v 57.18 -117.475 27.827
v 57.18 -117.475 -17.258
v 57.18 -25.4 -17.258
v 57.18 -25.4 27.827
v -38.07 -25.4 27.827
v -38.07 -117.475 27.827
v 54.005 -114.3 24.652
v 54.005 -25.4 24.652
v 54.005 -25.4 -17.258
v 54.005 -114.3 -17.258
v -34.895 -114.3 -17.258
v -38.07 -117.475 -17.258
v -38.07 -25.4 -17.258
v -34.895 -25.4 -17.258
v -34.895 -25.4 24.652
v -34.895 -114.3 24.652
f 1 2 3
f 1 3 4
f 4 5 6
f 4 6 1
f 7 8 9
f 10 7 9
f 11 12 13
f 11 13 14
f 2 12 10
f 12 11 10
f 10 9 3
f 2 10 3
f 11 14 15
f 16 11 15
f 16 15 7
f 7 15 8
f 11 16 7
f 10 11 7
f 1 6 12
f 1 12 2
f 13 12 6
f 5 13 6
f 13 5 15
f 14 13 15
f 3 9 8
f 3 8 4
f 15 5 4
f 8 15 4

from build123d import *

# Parameters (mm, degrees)
F1_DEPTH = 114.3
F3_W     = 95.25
F3_H     = 45.085
F4_DEPTH = 3.175
F6_D     = 27.432
F6_DEPTH = 3.175
F7_DEPTH = 3.175
F8_W     = 95.25
F8_H     = 25.4
F9_DEPTH = 45.086


with BuildPart() as f1:
    # F0 (on Front) → F1 (new body)
    with BuildSketch(Plane.XZ):
        Polygon((-38.070478, -17.257856), (-34.895478, -17.257856), (-34.895478, 24.652144), (54.004522, 24.652144), (54.004522, -17.257856), (57.179522, -17.257856), (57.179522, 27.827144), (-38.070478, 27.827144), align=None)
    extrude(amount=F1_DEPTH)

    # F3 (on face) + F0 (on Front) → F4 (join)
    with BuildSketch(Plane.XZ.offset(114.3)):
        with Locations((9.554522, 5.284644)):
            Rectangle(F3_W, F3_H)
    with BuildSketch(Plane.XZ):
        Polygon((-38.070478, -17.257856), (-34.895478, -17.257856), (-34.895478, 24.652144), (54.004522, 24.652144), (54.004522, -17.257856), (57.179522, -17.257856), (57.179522, 27.827144), (-38.070478, 27.827144), align=None)
        with BuildLine():
            Line((-34.895478, 24.652144), (-34.895478, -17.257856))
            Line((-34.895478, -17.257856), (-32.609478, -17.257856))
            Line((-32.609478, -17.257856), (-32.609478, 9.669455))
            ThreePointArc((-32.609478, 9.669455), (-18.893478, 21.604144), (-5.177478, 9.669455))
            Line((-5.177478, 9.669455), (-5.177478, -17.257856))
            Line((-5.177478, -17.257856), (54.004522, -17.257856))
            Line((54.004522, -17.257856), (54.004522, 24.652144))
            Line((54.004522, 24.652144), (-34.895478, 24.652144))
        make_face()
        with BuildLine():
            Line((-32.609478, 9.669455), (-32.609478, -17.257856))
            Line((-32.609478, -17.257856), (-5.177478, -17.257856))
            Line((-5.177478, -17.257856), (-5.177478, 9.669455))
            ThreePointArc((-5.177478, 9.669455), (-18.893478, 21.604144), (-32.609478, 9.669455))
        make_face()
    extrude(amount=F4_DEPTH)

    # F6
    with Locations(Plane(origin=(0, 0, 0), x_dir=(1, 0, 0), z_dir=(0, 1, 0))):
        with Locations((-21.159343, 10.779062)):
            Hole(F6_D / 2, depth=F6_DEPTH)

    # F5 (on face) → F7 (cut)
    with BuildSketch(Plane.XZ):
        with BuildLine():
            Line((-34.875343, 10.779062), (-7.443343, 10.779062))
            ThreePointArc((-7.443343, 10.779062), (-21.159343, 24.495062), (-34.875343, 10.779062))
        make_face()
        with BuildLine():
            Line((-7.443343, -18.13873), (-7.443343, 10.779062))
            ThreePointArc((-7.443343, 10.779062), (-21.159343, -2.936938), (-34.875343, 10.779062))
            Line((-34.875343, 10.779062), (-34.875343, -18.13873))
            Line((-34.875343, -18.13873), (-7.443343, -18.13873))
        make_face()
    extrude(amount=F7_DEPTH, mode=Mode.SUBTRACT)

    # F8 (on face) → F9 (cut, through all)
    with BuildSketch(Plane.XY.offset(27.827144)):
        with Locations((9.554522, -12.7)):
            Rectangle(F8_W, F8_H)
    extrude(amount=-F9_DEPTH, mode=Mode.SUBTRACT)


solid = f1.part
